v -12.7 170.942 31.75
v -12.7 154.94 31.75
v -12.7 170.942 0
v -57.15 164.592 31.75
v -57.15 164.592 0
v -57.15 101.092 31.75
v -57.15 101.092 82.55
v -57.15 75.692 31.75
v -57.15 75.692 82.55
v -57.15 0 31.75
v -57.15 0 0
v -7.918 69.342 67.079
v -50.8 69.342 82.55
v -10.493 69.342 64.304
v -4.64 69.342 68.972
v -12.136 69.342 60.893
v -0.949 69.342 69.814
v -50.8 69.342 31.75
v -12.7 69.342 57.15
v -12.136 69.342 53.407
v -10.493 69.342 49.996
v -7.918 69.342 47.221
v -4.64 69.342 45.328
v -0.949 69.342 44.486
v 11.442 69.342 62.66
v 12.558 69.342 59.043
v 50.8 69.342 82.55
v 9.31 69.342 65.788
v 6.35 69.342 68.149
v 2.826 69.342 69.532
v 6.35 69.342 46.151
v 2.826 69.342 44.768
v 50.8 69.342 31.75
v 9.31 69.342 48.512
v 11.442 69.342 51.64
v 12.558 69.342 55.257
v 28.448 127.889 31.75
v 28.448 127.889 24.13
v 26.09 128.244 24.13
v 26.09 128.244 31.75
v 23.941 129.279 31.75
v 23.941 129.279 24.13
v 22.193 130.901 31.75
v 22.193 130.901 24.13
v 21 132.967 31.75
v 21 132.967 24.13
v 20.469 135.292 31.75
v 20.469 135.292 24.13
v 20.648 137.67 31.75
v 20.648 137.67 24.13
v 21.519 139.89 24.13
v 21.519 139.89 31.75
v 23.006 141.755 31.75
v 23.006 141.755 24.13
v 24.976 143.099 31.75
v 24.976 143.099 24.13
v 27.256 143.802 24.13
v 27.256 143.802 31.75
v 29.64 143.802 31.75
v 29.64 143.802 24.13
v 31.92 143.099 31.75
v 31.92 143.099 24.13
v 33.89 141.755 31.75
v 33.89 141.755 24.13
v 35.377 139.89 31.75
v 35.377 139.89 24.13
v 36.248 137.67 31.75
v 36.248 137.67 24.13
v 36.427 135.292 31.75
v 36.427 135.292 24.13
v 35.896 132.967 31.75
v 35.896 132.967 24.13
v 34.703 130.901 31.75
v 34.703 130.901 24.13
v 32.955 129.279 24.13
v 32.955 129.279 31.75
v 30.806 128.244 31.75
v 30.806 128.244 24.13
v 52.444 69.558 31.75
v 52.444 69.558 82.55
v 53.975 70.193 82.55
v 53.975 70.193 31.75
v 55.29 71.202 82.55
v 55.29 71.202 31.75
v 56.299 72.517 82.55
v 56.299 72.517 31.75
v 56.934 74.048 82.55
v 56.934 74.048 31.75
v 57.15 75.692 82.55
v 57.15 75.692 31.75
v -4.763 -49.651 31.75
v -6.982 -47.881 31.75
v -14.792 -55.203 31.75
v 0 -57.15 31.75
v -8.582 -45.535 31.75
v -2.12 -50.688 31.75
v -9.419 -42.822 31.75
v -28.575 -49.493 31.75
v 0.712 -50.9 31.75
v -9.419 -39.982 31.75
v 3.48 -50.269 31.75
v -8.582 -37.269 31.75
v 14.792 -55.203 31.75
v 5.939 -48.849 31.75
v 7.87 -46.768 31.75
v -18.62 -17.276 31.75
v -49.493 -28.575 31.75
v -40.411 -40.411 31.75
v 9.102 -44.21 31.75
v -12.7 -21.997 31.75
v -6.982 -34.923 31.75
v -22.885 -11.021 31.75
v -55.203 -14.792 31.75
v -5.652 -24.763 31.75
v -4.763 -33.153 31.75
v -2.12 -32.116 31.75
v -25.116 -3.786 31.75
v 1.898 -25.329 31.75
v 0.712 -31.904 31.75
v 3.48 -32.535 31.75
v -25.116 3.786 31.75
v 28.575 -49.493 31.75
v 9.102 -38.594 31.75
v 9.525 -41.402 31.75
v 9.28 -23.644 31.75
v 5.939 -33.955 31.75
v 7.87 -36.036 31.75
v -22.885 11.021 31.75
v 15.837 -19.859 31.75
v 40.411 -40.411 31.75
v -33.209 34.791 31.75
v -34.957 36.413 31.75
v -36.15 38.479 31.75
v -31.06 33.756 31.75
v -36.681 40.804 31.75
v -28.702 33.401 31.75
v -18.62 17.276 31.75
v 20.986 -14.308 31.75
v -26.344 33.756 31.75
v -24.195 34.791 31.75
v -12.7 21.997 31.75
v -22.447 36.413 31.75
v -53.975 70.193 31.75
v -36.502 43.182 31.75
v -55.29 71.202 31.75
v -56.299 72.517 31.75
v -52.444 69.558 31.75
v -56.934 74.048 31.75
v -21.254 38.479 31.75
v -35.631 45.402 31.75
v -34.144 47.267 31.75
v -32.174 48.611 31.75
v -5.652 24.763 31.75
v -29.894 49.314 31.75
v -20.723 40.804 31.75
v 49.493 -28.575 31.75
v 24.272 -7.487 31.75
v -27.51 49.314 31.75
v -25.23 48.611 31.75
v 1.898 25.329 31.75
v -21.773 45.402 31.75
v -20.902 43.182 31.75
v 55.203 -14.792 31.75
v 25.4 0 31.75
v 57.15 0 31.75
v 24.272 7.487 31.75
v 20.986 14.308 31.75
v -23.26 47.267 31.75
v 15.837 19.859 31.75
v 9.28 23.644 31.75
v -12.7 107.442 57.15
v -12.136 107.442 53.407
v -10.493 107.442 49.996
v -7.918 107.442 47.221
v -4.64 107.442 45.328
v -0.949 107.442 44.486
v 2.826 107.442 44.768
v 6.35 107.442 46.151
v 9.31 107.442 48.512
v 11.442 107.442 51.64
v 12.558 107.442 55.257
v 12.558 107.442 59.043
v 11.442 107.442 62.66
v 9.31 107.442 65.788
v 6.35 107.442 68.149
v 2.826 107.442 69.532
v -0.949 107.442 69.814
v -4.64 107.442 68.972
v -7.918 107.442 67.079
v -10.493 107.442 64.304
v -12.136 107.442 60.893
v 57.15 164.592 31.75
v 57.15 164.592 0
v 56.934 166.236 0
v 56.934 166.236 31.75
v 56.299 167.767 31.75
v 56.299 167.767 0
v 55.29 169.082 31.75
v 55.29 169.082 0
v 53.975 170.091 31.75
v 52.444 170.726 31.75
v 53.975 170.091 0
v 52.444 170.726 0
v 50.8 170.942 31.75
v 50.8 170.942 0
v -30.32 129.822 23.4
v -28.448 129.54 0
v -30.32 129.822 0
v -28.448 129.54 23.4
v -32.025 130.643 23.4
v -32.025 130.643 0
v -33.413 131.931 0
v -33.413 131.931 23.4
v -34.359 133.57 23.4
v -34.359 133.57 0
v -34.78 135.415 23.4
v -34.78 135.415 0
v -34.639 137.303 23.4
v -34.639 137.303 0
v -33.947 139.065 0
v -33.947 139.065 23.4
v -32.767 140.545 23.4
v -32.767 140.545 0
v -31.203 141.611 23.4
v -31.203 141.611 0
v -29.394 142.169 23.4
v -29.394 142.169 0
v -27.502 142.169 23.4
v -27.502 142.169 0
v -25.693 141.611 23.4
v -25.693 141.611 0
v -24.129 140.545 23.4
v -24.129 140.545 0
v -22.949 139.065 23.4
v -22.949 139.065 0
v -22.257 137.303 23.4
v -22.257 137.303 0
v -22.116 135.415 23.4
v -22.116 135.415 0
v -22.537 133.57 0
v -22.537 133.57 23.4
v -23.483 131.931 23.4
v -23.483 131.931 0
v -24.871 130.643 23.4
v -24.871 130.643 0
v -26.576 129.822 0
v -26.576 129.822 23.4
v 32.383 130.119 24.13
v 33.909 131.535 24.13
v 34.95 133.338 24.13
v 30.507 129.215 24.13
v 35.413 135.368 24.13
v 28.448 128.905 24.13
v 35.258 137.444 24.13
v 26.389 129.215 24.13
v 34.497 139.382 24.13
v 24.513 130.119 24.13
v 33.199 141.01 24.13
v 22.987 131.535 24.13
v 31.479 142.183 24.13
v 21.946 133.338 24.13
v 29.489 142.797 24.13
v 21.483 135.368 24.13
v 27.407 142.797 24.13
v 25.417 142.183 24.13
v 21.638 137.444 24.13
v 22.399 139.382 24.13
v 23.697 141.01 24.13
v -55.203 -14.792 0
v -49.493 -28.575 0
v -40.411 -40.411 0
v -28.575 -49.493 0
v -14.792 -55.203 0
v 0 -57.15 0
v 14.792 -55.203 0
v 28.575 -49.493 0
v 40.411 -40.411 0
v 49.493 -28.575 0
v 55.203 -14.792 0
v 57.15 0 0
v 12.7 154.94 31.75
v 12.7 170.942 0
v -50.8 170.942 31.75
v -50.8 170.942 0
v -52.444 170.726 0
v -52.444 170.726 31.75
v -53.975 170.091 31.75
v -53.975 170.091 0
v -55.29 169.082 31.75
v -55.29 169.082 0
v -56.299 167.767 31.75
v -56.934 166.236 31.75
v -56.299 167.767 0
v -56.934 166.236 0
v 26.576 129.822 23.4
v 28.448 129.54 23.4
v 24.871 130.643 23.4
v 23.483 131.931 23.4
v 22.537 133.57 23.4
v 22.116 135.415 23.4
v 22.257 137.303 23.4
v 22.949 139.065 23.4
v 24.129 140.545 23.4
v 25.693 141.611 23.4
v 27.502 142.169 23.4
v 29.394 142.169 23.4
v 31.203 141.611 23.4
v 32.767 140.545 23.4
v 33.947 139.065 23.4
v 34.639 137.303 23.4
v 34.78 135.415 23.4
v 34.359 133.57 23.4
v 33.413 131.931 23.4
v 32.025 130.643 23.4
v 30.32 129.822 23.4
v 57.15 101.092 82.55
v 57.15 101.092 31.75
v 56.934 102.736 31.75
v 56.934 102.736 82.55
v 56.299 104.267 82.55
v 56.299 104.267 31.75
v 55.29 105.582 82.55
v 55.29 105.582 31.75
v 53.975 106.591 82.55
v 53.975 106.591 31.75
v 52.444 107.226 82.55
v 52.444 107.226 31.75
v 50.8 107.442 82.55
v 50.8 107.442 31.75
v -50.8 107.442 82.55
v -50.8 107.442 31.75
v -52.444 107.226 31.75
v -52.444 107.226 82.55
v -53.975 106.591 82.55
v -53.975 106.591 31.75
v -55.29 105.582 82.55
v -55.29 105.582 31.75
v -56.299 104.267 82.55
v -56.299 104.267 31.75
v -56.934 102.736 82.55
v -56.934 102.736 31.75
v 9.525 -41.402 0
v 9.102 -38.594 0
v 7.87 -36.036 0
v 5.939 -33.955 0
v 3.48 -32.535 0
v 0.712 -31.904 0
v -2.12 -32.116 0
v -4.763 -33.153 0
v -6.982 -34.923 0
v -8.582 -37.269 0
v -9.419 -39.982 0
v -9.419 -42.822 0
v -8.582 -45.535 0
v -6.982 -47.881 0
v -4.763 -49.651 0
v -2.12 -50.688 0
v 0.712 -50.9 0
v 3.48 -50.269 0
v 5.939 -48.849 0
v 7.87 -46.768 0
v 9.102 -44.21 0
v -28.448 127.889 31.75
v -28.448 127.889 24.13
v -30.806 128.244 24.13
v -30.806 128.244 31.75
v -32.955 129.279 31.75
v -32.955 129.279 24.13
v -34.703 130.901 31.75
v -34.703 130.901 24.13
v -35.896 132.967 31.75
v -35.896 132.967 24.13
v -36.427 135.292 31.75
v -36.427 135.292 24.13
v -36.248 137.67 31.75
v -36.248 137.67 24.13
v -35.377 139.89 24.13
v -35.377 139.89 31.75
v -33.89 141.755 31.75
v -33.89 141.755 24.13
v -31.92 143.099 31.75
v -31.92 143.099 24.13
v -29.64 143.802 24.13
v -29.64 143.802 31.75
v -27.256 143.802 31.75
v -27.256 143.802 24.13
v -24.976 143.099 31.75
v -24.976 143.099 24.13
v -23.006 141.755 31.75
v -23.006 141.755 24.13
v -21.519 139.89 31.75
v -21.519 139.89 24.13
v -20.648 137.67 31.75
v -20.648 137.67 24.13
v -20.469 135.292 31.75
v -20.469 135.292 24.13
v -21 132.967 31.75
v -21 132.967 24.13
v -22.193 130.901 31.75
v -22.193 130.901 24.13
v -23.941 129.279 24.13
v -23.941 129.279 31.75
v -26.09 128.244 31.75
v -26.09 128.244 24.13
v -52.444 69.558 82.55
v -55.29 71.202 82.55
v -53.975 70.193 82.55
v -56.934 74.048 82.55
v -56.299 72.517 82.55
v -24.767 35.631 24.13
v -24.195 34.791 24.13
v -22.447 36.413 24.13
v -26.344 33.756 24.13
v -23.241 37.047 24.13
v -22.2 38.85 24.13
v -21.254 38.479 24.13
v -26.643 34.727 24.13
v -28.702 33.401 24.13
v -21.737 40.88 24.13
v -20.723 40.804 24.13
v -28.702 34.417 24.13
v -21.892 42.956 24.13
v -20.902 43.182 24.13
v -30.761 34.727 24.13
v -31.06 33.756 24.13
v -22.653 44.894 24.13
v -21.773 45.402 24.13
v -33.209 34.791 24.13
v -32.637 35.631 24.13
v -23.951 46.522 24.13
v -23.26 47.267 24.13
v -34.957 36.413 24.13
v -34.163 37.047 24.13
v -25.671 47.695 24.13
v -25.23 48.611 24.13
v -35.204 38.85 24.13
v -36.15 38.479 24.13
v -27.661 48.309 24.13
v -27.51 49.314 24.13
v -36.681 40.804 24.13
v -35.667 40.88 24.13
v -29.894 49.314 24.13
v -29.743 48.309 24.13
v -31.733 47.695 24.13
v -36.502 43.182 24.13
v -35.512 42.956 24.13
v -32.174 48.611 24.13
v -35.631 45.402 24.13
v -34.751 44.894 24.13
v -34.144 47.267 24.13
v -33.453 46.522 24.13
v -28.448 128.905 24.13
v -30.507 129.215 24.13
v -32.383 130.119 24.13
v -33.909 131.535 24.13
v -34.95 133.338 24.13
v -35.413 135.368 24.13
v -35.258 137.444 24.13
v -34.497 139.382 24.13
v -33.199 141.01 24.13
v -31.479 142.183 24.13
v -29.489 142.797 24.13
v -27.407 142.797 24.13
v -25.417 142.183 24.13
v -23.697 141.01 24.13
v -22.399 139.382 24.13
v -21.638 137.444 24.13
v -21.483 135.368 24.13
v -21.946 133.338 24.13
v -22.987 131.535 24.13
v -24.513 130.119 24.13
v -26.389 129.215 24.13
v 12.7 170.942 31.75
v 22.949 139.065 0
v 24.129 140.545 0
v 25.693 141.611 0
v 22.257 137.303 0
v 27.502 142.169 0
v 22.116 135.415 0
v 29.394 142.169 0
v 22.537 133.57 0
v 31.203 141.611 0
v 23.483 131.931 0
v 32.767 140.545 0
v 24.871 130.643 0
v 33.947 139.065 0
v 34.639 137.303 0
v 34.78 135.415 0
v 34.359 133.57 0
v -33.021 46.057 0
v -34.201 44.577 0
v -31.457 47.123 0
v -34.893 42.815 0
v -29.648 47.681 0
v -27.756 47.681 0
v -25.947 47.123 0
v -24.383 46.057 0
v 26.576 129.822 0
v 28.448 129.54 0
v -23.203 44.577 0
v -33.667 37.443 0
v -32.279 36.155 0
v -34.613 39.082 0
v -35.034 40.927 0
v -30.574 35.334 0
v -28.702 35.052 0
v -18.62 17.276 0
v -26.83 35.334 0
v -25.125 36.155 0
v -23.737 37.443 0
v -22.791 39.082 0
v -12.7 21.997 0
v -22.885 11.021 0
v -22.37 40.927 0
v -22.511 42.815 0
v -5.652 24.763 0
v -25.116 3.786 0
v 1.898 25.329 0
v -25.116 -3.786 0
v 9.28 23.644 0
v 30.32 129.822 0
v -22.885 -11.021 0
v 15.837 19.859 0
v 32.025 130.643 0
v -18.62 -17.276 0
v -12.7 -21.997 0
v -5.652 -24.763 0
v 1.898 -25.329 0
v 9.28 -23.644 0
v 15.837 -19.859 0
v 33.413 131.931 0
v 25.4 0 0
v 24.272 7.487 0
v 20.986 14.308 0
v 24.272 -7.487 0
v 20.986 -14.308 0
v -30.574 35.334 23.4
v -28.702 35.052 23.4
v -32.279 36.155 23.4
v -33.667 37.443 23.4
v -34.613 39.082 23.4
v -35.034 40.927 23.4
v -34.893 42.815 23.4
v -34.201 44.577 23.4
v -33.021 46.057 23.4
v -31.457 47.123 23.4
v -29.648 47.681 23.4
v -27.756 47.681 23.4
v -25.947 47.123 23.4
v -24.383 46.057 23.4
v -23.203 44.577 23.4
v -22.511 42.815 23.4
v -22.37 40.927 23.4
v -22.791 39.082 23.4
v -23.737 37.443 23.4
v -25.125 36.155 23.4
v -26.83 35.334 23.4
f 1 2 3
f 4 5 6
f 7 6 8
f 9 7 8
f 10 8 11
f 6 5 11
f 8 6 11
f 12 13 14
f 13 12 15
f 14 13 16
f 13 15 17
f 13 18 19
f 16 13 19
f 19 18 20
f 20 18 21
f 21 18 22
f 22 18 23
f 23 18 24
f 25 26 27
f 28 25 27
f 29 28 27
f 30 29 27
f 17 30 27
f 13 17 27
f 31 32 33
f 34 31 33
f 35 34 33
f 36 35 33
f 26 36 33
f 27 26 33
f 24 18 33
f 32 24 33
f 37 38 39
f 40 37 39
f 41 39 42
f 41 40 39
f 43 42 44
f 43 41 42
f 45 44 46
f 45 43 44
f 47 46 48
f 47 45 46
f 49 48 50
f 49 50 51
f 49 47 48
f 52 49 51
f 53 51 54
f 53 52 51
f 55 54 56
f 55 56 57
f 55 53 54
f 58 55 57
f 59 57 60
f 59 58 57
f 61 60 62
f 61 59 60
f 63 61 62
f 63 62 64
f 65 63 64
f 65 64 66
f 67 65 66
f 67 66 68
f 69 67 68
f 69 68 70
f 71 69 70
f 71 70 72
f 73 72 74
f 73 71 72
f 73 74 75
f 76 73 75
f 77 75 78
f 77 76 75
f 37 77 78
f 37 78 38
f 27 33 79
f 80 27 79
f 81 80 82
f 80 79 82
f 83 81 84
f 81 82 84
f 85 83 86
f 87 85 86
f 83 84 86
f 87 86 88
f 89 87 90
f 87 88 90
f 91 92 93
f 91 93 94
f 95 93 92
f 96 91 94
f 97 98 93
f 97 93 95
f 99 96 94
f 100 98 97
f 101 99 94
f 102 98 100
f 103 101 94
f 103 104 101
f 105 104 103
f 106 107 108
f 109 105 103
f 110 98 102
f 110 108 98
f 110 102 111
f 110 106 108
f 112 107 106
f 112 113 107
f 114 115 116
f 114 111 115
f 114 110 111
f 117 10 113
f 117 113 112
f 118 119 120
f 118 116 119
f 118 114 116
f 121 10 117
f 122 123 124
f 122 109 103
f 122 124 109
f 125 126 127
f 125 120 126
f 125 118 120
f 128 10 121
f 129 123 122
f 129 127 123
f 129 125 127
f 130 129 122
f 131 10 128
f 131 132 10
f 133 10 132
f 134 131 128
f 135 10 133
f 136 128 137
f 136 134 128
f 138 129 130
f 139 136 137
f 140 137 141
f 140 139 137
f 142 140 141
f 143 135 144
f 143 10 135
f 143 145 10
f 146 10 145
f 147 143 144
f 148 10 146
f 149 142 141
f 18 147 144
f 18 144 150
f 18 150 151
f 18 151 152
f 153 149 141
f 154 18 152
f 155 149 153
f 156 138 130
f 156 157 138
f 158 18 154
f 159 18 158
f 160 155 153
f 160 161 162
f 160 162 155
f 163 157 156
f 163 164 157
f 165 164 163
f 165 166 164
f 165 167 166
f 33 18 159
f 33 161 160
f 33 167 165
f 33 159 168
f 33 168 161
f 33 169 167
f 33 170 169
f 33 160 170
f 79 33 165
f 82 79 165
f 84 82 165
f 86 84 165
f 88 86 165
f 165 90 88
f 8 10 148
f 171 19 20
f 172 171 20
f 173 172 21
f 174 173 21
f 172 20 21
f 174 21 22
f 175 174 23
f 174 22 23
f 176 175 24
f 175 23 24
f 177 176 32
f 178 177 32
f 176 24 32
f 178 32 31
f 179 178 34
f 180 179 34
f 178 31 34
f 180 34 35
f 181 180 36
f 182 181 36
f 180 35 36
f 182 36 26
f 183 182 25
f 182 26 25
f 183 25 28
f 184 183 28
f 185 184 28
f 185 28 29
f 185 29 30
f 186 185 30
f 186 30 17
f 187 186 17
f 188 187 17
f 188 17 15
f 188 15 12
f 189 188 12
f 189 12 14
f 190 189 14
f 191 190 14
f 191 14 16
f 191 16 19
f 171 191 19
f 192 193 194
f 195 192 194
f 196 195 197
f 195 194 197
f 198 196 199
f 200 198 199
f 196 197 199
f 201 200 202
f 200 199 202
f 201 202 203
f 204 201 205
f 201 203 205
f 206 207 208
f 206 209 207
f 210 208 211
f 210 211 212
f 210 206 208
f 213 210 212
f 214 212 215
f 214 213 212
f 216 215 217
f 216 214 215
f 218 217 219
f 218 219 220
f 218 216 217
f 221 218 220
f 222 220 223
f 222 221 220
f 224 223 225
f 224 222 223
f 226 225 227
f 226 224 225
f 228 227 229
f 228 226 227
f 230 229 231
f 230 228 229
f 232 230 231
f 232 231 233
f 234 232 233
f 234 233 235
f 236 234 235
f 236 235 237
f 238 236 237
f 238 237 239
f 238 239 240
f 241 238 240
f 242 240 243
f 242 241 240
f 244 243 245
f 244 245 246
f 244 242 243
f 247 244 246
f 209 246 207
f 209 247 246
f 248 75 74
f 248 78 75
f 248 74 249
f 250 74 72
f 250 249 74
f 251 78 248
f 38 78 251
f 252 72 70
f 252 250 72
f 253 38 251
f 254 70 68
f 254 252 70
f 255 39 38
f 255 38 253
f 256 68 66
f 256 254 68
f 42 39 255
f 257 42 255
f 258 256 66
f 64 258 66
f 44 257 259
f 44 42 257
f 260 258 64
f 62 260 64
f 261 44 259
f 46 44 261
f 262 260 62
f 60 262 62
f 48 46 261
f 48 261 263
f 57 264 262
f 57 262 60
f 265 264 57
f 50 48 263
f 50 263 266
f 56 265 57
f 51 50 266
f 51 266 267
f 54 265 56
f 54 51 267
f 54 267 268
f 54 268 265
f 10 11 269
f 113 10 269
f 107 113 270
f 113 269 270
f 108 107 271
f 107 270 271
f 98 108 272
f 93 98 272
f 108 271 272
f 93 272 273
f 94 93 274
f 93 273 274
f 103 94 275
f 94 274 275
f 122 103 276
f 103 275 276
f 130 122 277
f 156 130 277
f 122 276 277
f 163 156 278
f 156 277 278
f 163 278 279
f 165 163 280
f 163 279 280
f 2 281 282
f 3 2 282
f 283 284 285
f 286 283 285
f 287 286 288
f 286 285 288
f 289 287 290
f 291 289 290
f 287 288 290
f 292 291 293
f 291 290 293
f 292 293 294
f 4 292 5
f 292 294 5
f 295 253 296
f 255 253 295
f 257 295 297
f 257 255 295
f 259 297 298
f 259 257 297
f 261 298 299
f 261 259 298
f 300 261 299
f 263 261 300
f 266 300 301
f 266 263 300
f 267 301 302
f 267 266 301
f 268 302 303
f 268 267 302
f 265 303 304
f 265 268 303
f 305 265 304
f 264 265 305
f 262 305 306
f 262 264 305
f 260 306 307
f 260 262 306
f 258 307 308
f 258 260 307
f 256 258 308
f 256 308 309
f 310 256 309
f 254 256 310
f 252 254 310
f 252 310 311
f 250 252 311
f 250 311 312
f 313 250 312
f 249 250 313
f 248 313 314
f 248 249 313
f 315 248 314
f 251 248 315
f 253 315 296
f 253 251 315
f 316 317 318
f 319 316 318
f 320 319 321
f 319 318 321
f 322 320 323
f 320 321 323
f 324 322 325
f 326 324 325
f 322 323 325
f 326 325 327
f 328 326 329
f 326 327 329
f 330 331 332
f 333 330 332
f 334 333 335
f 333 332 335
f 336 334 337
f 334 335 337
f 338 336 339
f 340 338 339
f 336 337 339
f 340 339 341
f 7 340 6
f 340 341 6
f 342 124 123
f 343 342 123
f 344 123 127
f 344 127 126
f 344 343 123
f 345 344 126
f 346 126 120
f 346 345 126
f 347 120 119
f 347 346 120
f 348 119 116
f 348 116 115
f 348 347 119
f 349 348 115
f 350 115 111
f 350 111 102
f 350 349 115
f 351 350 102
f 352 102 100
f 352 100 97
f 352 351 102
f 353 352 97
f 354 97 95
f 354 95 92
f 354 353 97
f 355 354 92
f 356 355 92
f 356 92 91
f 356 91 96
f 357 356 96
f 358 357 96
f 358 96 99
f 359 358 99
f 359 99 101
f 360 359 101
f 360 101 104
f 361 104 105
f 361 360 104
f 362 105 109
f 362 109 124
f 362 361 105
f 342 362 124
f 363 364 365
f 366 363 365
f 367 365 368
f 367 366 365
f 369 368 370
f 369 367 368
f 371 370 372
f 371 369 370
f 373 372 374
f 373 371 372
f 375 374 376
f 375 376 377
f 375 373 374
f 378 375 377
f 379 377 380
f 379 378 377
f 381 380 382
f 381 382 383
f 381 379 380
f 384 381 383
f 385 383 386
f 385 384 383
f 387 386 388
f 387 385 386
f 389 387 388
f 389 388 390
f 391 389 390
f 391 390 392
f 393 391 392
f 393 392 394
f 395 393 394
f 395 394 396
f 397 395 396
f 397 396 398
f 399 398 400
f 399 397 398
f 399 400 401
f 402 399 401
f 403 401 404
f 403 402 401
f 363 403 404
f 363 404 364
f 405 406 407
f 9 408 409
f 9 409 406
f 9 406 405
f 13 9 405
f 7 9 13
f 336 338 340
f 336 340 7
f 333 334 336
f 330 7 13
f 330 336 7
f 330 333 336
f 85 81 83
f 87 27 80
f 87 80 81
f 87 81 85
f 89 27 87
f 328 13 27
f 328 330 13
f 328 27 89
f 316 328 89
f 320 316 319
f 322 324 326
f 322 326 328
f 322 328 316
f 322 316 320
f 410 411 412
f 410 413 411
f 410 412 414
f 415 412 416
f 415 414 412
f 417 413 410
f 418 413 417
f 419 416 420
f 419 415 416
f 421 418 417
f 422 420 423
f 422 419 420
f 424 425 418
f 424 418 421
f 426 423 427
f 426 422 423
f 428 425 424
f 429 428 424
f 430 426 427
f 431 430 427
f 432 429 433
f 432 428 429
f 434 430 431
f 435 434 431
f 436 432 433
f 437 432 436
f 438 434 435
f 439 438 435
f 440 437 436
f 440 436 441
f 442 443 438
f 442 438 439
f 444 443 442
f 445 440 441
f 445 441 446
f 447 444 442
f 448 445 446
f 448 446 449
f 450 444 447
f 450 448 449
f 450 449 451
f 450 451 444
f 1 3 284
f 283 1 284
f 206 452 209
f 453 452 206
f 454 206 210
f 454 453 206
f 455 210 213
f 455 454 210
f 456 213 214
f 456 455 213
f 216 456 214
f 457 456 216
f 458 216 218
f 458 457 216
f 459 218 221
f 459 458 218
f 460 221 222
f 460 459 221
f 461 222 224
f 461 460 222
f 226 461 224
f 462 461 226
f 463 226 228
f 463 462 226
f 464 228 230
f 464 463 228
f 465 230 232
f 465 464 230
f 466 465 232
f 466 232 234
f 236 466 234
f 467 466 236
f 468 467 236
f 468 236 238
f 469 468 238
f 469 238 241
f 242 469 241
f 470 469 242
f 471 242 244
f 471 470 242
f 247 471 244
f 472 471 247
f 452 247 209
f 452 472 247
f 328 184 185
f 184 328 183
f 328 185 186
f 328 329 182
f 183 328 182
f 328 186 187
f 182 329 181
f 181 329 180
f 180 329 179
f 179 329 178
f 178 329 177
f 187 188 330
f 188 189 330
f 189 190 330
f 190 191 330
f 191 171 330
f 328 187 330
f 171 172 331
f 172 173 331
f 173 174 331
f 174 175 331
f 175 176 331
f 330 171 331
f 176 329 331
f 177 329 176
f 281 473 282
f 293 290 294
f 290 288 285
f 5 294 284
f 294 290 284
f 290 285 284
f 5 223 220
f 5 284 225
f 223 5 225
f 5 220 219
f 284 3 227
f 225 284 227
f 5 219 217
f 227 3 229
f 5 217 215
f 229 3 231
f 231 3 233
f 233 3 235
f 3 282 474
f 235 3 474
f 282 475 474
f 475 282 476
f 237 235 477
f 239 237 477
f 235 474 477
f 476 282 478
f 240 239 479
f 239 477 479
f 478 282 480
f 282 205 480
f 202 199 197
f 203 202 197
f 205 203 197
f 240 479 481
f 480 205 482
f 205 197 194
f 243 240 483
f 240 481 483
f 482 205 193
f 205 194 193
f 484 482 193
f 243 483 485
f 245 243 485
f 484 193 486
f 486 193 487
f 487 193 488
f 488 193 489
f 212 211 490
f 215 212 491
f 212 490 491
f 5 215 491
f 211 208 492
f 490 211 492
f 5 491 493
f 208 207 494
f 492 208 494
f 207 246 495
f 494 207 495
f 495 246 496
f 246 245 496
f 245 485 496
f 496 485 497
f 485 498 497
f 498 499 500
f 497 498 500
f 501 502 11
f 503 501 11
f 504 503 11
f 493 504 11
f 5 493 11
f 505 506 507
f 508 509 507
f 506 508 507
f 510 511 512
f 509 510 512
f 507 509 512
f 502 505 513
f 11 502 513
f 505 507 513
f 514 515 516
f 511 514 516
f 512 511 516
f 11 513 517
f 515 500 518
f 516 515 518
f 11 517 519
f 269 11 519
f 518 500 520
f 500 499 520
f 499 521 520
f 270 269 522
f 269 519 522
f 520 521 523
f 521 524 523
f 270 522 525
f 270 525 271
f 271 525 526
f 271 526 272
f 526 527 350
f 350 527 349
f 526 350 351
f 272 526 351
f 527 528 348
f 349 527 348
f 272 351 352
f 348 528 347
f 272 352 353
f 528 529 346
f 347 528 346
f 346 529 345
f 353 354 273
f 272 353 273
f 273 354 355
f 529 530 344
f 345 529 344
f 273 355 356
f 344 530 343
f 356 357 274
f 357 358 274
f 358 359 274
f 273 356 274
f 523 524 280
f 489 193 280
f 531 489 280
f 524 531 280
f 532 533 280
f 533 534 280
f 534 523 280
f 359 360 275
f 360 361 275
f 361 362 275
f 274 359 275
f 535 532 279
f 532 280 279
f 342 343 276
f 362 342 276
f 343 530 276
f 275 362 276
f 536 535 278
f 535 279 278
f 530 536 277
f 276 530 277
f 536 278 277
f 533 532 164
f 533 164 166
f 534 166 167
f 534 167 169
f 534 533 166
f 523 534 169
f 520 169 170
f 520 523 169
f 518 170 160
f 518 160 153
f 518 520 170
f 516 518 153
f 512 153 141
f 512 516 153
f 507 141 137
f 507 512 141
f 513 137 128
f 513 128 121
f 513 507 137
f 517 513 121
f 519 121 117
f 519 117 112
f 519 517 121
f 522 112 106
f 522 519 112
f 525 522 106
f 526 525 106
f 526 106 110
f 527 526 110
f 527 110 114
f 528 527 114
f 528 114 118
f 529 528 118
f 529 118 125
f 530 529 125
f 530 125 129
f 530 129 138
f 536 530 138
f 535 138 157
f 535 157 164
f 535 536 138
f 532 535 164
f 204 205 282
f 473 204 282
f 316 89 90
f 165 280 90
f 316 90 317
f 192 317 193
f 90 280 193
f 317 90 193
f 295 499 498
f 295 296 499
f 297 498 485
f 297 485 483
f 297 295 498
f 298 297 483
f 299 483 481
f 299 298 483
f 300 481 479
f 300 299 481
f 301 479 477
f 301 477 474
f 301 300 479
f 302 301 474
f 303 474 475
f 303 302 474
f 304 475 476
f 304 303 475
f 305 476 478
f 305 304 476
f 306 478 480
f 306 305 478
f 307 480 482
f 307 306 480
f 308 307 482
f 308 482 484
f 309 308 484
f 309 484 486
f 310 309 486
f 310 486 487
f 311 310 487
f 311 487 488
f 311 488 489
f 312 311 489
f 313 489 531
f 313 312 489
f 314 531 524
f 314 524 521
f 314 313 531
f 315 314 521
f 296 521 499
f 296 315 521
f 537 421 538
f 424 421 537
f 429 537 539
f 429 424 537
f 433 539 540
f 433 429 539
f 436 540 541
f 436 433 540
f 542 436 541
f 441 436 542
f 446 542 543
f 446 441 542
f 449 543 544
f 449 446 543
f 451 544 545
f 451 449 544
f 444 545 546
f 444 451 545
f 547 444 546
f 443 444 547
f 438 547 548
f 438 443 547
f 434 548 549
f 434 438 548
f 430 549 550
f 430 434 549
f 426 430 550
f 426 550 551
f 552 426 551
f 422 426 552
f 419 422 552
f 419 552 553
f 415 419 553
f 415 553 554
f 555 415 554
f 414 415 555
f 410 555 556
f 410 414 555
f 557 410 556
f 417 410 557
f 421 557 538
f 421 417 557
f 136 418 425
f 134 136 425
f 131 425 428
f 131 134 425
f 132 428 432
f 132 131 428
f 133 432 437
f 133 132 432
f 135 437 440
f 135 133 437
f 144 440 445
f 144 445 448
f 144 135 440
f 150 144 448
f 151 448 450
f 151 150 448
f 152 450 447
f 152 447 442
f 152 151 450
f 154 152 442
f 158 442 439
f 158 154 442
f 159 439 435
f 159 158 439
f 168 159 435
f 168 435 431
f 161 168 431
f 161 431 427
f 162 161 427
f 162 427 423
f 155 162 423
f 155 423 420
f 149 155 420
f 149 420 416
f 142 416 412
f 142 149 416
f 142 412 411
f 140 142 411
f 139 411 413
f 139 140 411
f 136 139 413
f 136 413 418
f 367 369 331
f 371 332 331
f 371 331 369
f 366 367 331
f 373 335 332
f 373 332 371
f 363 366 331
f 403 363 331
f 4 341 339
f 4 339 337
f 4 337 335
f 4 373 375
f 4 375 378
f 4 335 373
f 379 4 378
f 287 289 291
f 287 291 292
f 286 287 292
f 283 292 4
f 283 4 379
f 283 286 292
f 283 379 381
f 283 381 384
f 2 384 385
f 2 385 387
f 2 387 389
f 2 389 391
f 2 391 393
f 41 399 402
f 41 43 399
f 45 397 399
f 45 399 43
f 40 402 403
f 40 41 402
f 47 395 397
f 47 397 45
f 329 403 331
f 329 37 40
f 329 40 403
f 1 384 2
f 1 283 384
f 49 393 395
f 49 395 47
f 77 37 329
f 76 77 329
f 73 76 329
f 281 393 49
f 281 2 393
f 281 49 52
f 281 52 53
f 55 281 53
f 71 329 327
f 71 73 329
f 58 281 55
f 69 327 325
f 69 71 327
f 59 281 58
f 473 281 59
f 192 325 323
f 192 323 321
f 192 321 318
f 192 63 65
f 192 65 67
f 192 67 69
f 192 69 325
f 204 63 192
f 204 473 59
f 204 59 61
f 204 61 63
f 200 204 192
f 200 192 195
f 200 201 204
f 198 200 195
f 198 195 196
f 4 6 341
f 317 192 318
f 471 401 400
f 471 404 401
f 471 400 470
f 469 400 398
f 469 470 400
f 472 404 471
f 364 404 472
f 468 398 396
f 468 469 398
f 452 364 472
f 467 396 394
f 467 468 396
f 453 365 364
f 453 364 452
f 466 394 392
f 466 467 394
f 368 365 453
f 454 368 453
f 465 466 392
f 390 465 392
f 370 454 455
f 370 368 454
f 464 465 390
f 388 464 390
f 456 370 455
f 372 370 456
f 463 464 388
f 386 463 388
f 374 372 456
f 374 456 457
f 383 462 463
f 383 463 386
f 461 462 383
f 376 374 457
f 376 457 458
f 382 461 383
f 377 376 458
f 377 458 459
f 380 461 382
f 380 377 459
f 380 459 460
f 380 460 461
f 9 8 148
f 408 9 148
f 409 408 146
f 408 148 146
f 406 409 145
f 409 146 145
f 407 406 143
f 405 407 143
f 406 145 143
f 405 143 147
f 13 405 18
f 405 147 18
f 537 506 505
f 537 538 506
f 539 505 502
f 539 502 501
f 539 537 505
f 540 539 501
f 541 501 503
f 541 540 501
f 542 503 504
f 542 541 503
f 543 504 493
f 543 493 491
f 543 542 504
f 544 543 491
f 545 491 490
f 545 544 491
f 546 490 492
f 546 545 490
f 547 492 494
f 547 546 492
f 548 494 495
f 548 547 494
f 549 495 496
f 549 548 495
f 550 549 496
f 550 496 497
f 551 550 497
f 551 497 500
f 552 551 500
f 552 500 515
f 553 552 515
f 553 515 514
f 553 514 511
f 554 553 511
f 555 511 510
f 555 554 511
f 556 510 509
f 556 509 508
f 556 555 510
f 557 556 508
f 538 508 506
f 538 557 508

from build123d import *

# Parameters (mm, degrees)
SALIENTE_EXTRUIR1_DEPTH                     = 31.75
CROQUIS1_R                                  = 9.525
CROQUIS1_R_2                                = 25.4
SALIENTE_EXTRUIR1_2_DEPTH                   = 31.75
SALIENTE_EXTRUIR2_DEPTH                     = 82.55
SALIENTE_EXTRUIR3_REACH                     = 204.274
TALADRO1_D                                  = 25.4
REFRENTADO_PARA_TORNILLO_CON_CABEZA_2_COUNT = 2
REFRENTADO_PARA_TORNILLO_CON_CABEZA_2_PITCH = 56.896
REFRENTADO_PARA_TORNILLO_CON_CABEZA_3_COUNT = 2
REFRENTADO_PARA_TORNILLO_CON_CABEZA_3_PITCH = 110.426919924


with BuildPart() as part:
    # Croquis1 → Saliente-Extruir1 (new body)
    with BuildSketch(Plane.XY):
        with BuildLine():
            Line((50.8, 170.942), (12.7, 170.942))
            Line((12.7, 170.942), (12.7, 154.94))
            Line((12.7, 154.94), (-12.7, 154.94))
            Line((-12.7, 154.94), (-12.7, 170.942))
            Line((-12.7, 170.942), (-50.8, 170.942))
            ThreePointArc((-50.8, 170.942), (-55.290128061, 169.082128061), (-57.15, 164.592))
            Line((-57.15, 164.592), (-57.15, 101.092))
            ThreePointArc((-57.15, 101.092), (-55.290128061, 105.582128061), (-50.8, 107.442))
            Line((-50.8, 107.442), (50.8, 107.442))
            ThreePointArc((50.8, 107.442), (55.290128061, 105.582128061), (57.15, 101.092))
            Line((57.15, 101.092), (57.15, 164.592))
            ThreePointArc((57.15, 164.592), (55.290128061, 169.082128061), (50.8, 170.942))
        make_face()
    extrude(amount=SALIENTE_EXTRUIR1_DEPTH)



with BuildPart() as body_2:
    # Croquis1 → Saliente-Extruir1 2 (new body)
    with BuildSketch(Plane.XY):
        with BuildLine():
            Line((57.15, 0), (57.15, 75.692))
            ThreePointArc((57.15, 75.692), (55.290128061, 71.201871939), (50.8, 69.342))
            Line((50.8, 69.342), (-50.8, 69.342))
            ThreePointArc((-50.8, 69.342), (-55.290128061, 71.201871939), (-57.15, 75.692))
            Line((-57.15, 75.692), (-57.15, 0))
            ThreePointArc((-57.15, 0), (0, -57.15), (57.15, 0))
        make_face()
        with Locations((0, -41.402)):
            Circle(CROQUIS1_R, mode=Mode.SUBTRACT)
        Circle(CROQUIS1_R_2, mode=Mode.SUBTRACT)
    extrude(amount=SALIENTE_EXTRUIR1_2_DEPTH)


with BuildPart() as part_1:
    add(part.part)

    add(body_2.part)  # Saliente-Extruir2 merges body 2
    # Croquis1<3> → Saliente-Extruir2 (add)
    with BuildSketch(Plane.XY):
        with BuildLine():
            Line((57.15, 75.692), (57.15, 101.092))
            ThreePointArc((57.15, 101.092), (55.290128061, 105.582128061), (50.8, 107.442))
            Line((50.8, 107.442), (-50.8, 107.442))
            ThreePointArc((-50.8, 107.442), (-55.290128061, 105.582128061), (-57.15, 101.092))
            Line((-57.15, 101.092), (-57.15, 75.692))
            ThreePointArc((-57.15, 75.692), (-55.290128061, 71.201871939), (-50.8, 69.342))
            Line((-50.8, 69.342), (50.8, 69.342))
            ThreePointArc((50.8, 69.342), (55.290128061, 71.201871939), (57.15, 75.692))
        make_face()
    extrude(amount=SALIENTE_EXTRUIR2_DEPTH)

    # Croquis4 → Saliente-Extruir3 (add, up to next)
    with BuildSketch(Plane.ZY.offset(-12.7), mode=Mode.PRIVATE) as saliente_extruir3_sk1:
        Polygon((31.75, 154.94), (0, 170.942), (0, 154.94), align=None)
    saliente_extruir3_tool1 = extrude(saliente_extruir3_sk1.sketch, amount=SALIENTE_EXTRUIR3_REACH, mode=Mode.PRIVATE) - part_1.part
    add(saliente_extruir3_tool1.solids().sort_by_distance((12.7, 160.274, 10.583333))[0])

    # Taladro1 (through all)
    with Locations(Plane(origin=(0, 107.442, 0), x_dir=(1, 0, 0), z_dir=(0, 1, 0))):
        with Locations((0, -57.15)):
            Hole(TALADRO1_D / 2)

    # Croquis10 → Refrentado para tornillo con cabeza troncocónica de #01 (revolve, cut)
    with BuildSketch(Plane(origin=(28.448, 135.89, 31.75), x_dir=(0, -1, 0), z_dir=(1, 0, 0))):
        Polygon((0, 0), (0, 31.75), (6.35, 31.75), (6.35, 8.350483939), (6.985, 7.62), (8.001, 7.62), (8.001, 0), align=None)
    refrentado_para_tornillo_con_cabeza_tron = revolve(axis=Axis((28.448, 135.89, 38.1), (0, 0, -1)), mode=Mode.SUBTRACT)

    # Refrentado para tornillo con cabeza  2: Refrentado para tornillo con cabeza troncocónica de #01 ×2
    with Locations(*[(-i * REFRENTADO_PARA_TORNILLO_CON_CABEZA_2_PITCH, 0, 0) for i in range(1, REFRENTADO_PARA_TORNILLO_CON_CABEZA_2_COUNT)]):
        add(refrentado_para_tornillo_con_cabeza_tron, mode=Mode.SUBTRACT)

    # Refrentado para tornillo con cabeza  3: Refrentado para tornillo con cabeza troncocónica de #01 ×2
    with Locations(*[Vector(-0.5175368473475671, -0.8556609209479776, 0) * (i * REFRENTADO_PARA_TORNILLO_CON_CABEZA_3_PITCH) for i in range(1, REFRENTADO_PARA_TORNILLO_CON_CABEZA_3_COUNT)]):
        add(refrentado_para_tornillo_con_cabeza_tron, mode=Mode.SUBTRACT)


solid = part_1.part
